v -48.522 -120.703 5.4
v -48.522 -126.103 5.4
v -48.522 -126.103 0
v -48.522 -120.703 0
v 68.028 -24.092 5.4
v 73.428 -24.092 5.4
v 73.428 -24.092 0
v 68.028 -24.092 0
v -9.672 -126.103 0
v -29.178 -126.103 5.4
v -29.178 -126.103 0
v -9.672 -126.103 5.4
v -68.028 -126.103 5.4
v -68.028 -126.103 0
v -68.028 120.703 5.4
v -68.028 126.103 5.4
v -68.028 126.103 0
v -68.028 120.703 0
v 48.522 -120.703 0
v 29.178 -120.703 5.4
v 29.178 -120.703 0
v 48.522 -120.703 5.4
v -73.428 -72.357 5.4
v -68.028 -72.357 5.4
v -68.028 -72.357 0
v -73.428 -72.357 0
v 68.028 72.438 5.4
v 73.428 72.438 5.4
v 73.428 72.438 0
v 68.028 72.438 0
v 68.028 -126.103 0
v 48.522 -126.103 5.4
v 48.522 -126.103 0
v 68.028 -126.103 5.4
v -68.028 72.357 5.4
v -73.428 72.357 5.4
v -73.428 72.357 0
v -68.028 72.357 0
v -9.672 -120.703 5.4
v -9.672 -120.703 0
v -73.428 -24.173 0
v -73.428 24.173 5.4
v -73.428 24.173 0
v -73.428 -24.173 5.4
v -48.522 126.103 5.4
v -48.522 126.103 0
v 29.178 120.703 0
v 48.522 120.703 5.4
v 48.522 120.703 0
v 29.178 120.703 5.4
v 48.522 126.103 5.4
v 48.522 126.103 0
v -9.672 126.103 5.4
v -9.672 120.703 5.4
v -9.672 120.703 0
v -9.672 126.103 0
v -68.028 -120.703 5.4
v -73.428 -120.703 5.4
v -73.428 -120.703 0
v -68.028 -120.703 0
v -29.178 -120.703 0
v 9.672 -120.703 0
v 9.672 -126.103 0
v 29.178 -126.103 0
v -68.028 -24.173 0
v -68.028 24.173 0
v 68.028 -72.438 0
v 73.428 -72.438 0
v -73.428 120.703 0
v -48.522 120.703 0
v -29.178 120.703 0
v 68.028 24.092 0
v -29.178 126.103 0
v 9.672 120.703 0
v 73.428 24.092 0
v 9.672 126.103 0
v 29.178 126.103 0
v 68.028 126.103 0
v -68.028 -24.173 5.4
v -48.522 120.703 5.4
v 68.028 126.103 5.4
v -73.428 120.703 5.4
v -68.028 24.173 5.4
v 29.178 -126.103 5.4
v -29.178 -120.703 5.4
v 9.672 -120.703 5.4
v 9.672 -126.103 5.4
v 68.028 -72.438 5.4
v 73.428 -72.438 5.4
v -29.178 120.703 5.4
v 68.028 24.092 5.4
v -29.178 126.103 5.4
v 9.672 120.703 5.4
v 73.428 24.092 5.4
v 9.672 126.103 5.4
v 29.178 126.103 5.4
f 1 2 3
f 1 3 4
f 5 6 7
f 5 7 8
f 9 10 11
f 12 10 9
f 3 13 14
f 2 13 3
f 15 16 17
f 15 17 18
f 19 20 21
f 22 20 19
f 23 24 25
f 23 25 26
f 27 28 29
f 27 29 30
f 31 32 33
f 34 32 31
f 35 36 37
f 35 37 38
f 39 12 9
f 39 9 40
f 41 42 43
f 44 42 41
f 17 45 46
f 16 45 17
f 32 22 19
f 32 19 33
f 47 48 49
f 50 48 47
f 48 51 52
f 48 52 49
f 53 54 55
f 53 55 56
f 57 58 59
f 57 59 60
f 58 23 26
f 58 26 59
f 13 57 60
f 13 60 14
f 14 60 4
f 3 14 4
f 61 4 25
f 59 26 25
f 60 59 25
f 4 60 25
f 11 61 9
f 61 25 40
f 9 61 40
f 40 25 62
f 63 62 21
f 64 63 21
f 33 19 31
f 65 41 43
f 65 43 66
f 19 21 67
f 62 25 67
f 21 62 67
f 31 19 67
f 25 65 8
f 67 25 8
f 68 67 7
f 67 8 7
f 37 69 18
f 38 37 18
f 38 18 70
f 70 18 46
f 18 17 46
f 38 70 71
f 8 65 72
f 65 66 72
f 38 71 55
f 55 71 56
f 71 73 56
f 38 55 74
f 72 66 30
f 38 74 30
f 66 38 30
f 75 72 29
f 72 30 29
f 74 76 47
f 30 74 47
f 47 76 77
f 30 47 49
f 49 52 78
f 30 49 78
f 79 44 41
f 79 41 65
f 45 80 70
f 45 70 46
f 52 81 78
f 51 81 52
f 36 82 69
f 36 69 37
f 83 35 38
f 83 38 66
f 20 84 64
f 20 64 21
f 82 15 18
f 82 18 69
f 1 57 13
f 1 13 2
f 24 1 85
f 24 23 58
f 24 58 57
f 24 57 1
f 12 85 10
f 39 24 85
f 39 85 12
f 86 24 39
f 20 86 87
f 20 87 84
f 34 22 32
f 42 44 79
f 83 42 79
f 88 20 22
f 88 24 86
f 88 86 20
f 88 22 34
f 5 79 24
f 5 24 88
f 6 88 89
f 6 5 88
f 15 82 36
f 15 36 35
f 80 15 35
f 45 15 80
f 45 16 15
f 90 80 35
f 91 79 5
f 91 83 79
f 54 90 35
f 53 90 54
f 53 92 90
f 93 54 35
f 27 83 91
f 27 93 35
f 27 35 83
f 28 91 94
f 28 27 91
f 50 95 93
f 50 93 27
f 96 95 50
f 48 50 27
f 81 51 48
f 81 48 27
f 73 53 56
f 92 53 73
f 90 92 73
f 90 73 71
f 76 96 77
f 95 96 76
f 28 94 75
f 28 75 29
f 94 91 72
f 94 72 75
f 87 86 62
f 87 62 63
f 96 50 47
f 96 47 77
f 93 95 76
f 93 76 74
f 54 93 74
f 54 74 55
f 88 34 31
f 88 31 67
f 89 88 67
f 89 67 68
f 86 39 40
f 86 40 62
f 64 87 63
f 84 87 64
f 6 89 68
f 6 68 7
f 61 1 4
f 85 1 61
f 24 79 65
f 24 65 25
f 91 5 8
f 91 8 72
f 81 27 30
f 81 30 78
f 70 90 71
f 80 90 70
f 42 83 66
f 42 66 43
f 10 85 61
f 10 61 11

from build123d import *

# Parameters (mm, degrees)
SKETCH1_W           = 135.975
SKETCH1_H           = 241.325
SKETCH1_W_2         = 19.425
SKETCH1_H_2         = 5.4
SKETCH1_W_3         = 5.4
SKETCH1_H_3         = 48.265
BOSS_EXTRUDE1_DEPTH = 5.4
BOSS_EXTRUDE2_DEPTH = 5.4


with BuildPart() as part:
    # Sketch1 → Boss-Extrude1 (new body)
    with BuildSketch(Plane.XY):
        Rectangle(SKETCH1_W, SKETCH1_H)
        with Locations((58.275, 123.3625)):
            Rectangle(SKETCH1_W_2, SKETCH1_H_2)
        with Locations((19.425, 123.3625)):
            Rectangle(SKETCH1_W_2, SKETCH1_H_2)
        with Locations((-19.425, 123.3625)):
            Rectangle(SKETCH1_W_2, SKETCH1_H_2)
        with Locations((-70.6875, 96.53)):
            Rectangle(SKETCH1_W_3, SKETCH1_H_3)
        with Locations((-58.275, 123.3625)):
            Rectangle(SKETCH1_W_2, SKETCH1_H_2)
        with Locations((70.6875, 48.265)):
            Rectangle(SKETCH1_W_3, SKETCH1_H_3)
        with Locations((-70.6875, 0)):
            Rectangle(SKETCH1_W_3, SKETCH1_H_3)
        with Locations((70.6875, -48.265)):
            Rectangle(SKETCH1_W_3, SKETCH1_H_3)
        with Locations((-70.6875, -96.53)):
            Rectangle(SKETCH1_W_3, SKETCH1_H_3)
        with Locations((-58.275, -123.3625)):
            Rectangle(SKETCH1_W_2, SKETCH1_H_2)
        with Locations((-19.425, -123.3625)):
            Rectangle(SKETCH1_W_2, SKETCH1_H_2)
        with Locations((19.425, -123.3625)):
            Rectangle(SKETCH1_W_2, SKETCH1_H_2)
        with Locations((58.275, -123.3625)):
            Rectangle(SKETCH1_W_2, SKETCH1_H_2)
    extrude(amount=BOSS_EXTRUDE1_DEPTH)

    # Sketch2 → Boss-Extrude2 (add)
    with BuildSketch(Plane.XY.offset(5.4)):
        Polygon((-48.52186, -120.70314), (-29.17814, -120.70314), (-29.17814, -126.10314), (-9.67186, -126.10314), (-9.67186, -120.70314), (9.67186, -120.70314), (9.67186, -126.10314), (29.17814, -126.10314), (29.17814, -120.70314), (48.52186, -120.70314), (48.52186, -126.10314), (68.02814, -126.10314), (68.02814, -72.43814), (73.42814, -72.43814), (73.42814, -24.09186), (68.02814, -24.09186), (68.02814, 24.09186), (73.42814, 24.09186), (73.42814, 72.43814), (68.02814, 72.43814), (68.02814, 126.10314), (48.52186, 126.10314), (48.52186, 120.70314), (29.17814, 120.70314), (29.17814, 126.10314), (9.67186, 126.10314), (9.67186, 120.70314), (-9.67186, 120.70314), (-9.67186, 126.10314), (-29.17814, 126.10314), (-29.17814, 120.70314), (-48.52186, 120.70314), (-48.52186, 126.10314), (-68.02814, 126.10314), (-68.02814, 120.70314), (-73.42814, 120.70314), (-73.42814, 72.35686), (-68.02814, 72.35686), (-68.02814, 24.17314), (-73.42814, 24.17314), (-73.42814, -24.17314), (-68.02814, -24.17314), (-68.02814, -72.35686), (-73.42814, -72.35686), (-73.42814, -120.70314), (-68.02814, -120.70314), (-68.02814, -126.10314), (-48.52186, -126.10314), align=None)
    extrude(amount=-BOSS_EXTRUDE2_DEPTH)


solid = part.part
